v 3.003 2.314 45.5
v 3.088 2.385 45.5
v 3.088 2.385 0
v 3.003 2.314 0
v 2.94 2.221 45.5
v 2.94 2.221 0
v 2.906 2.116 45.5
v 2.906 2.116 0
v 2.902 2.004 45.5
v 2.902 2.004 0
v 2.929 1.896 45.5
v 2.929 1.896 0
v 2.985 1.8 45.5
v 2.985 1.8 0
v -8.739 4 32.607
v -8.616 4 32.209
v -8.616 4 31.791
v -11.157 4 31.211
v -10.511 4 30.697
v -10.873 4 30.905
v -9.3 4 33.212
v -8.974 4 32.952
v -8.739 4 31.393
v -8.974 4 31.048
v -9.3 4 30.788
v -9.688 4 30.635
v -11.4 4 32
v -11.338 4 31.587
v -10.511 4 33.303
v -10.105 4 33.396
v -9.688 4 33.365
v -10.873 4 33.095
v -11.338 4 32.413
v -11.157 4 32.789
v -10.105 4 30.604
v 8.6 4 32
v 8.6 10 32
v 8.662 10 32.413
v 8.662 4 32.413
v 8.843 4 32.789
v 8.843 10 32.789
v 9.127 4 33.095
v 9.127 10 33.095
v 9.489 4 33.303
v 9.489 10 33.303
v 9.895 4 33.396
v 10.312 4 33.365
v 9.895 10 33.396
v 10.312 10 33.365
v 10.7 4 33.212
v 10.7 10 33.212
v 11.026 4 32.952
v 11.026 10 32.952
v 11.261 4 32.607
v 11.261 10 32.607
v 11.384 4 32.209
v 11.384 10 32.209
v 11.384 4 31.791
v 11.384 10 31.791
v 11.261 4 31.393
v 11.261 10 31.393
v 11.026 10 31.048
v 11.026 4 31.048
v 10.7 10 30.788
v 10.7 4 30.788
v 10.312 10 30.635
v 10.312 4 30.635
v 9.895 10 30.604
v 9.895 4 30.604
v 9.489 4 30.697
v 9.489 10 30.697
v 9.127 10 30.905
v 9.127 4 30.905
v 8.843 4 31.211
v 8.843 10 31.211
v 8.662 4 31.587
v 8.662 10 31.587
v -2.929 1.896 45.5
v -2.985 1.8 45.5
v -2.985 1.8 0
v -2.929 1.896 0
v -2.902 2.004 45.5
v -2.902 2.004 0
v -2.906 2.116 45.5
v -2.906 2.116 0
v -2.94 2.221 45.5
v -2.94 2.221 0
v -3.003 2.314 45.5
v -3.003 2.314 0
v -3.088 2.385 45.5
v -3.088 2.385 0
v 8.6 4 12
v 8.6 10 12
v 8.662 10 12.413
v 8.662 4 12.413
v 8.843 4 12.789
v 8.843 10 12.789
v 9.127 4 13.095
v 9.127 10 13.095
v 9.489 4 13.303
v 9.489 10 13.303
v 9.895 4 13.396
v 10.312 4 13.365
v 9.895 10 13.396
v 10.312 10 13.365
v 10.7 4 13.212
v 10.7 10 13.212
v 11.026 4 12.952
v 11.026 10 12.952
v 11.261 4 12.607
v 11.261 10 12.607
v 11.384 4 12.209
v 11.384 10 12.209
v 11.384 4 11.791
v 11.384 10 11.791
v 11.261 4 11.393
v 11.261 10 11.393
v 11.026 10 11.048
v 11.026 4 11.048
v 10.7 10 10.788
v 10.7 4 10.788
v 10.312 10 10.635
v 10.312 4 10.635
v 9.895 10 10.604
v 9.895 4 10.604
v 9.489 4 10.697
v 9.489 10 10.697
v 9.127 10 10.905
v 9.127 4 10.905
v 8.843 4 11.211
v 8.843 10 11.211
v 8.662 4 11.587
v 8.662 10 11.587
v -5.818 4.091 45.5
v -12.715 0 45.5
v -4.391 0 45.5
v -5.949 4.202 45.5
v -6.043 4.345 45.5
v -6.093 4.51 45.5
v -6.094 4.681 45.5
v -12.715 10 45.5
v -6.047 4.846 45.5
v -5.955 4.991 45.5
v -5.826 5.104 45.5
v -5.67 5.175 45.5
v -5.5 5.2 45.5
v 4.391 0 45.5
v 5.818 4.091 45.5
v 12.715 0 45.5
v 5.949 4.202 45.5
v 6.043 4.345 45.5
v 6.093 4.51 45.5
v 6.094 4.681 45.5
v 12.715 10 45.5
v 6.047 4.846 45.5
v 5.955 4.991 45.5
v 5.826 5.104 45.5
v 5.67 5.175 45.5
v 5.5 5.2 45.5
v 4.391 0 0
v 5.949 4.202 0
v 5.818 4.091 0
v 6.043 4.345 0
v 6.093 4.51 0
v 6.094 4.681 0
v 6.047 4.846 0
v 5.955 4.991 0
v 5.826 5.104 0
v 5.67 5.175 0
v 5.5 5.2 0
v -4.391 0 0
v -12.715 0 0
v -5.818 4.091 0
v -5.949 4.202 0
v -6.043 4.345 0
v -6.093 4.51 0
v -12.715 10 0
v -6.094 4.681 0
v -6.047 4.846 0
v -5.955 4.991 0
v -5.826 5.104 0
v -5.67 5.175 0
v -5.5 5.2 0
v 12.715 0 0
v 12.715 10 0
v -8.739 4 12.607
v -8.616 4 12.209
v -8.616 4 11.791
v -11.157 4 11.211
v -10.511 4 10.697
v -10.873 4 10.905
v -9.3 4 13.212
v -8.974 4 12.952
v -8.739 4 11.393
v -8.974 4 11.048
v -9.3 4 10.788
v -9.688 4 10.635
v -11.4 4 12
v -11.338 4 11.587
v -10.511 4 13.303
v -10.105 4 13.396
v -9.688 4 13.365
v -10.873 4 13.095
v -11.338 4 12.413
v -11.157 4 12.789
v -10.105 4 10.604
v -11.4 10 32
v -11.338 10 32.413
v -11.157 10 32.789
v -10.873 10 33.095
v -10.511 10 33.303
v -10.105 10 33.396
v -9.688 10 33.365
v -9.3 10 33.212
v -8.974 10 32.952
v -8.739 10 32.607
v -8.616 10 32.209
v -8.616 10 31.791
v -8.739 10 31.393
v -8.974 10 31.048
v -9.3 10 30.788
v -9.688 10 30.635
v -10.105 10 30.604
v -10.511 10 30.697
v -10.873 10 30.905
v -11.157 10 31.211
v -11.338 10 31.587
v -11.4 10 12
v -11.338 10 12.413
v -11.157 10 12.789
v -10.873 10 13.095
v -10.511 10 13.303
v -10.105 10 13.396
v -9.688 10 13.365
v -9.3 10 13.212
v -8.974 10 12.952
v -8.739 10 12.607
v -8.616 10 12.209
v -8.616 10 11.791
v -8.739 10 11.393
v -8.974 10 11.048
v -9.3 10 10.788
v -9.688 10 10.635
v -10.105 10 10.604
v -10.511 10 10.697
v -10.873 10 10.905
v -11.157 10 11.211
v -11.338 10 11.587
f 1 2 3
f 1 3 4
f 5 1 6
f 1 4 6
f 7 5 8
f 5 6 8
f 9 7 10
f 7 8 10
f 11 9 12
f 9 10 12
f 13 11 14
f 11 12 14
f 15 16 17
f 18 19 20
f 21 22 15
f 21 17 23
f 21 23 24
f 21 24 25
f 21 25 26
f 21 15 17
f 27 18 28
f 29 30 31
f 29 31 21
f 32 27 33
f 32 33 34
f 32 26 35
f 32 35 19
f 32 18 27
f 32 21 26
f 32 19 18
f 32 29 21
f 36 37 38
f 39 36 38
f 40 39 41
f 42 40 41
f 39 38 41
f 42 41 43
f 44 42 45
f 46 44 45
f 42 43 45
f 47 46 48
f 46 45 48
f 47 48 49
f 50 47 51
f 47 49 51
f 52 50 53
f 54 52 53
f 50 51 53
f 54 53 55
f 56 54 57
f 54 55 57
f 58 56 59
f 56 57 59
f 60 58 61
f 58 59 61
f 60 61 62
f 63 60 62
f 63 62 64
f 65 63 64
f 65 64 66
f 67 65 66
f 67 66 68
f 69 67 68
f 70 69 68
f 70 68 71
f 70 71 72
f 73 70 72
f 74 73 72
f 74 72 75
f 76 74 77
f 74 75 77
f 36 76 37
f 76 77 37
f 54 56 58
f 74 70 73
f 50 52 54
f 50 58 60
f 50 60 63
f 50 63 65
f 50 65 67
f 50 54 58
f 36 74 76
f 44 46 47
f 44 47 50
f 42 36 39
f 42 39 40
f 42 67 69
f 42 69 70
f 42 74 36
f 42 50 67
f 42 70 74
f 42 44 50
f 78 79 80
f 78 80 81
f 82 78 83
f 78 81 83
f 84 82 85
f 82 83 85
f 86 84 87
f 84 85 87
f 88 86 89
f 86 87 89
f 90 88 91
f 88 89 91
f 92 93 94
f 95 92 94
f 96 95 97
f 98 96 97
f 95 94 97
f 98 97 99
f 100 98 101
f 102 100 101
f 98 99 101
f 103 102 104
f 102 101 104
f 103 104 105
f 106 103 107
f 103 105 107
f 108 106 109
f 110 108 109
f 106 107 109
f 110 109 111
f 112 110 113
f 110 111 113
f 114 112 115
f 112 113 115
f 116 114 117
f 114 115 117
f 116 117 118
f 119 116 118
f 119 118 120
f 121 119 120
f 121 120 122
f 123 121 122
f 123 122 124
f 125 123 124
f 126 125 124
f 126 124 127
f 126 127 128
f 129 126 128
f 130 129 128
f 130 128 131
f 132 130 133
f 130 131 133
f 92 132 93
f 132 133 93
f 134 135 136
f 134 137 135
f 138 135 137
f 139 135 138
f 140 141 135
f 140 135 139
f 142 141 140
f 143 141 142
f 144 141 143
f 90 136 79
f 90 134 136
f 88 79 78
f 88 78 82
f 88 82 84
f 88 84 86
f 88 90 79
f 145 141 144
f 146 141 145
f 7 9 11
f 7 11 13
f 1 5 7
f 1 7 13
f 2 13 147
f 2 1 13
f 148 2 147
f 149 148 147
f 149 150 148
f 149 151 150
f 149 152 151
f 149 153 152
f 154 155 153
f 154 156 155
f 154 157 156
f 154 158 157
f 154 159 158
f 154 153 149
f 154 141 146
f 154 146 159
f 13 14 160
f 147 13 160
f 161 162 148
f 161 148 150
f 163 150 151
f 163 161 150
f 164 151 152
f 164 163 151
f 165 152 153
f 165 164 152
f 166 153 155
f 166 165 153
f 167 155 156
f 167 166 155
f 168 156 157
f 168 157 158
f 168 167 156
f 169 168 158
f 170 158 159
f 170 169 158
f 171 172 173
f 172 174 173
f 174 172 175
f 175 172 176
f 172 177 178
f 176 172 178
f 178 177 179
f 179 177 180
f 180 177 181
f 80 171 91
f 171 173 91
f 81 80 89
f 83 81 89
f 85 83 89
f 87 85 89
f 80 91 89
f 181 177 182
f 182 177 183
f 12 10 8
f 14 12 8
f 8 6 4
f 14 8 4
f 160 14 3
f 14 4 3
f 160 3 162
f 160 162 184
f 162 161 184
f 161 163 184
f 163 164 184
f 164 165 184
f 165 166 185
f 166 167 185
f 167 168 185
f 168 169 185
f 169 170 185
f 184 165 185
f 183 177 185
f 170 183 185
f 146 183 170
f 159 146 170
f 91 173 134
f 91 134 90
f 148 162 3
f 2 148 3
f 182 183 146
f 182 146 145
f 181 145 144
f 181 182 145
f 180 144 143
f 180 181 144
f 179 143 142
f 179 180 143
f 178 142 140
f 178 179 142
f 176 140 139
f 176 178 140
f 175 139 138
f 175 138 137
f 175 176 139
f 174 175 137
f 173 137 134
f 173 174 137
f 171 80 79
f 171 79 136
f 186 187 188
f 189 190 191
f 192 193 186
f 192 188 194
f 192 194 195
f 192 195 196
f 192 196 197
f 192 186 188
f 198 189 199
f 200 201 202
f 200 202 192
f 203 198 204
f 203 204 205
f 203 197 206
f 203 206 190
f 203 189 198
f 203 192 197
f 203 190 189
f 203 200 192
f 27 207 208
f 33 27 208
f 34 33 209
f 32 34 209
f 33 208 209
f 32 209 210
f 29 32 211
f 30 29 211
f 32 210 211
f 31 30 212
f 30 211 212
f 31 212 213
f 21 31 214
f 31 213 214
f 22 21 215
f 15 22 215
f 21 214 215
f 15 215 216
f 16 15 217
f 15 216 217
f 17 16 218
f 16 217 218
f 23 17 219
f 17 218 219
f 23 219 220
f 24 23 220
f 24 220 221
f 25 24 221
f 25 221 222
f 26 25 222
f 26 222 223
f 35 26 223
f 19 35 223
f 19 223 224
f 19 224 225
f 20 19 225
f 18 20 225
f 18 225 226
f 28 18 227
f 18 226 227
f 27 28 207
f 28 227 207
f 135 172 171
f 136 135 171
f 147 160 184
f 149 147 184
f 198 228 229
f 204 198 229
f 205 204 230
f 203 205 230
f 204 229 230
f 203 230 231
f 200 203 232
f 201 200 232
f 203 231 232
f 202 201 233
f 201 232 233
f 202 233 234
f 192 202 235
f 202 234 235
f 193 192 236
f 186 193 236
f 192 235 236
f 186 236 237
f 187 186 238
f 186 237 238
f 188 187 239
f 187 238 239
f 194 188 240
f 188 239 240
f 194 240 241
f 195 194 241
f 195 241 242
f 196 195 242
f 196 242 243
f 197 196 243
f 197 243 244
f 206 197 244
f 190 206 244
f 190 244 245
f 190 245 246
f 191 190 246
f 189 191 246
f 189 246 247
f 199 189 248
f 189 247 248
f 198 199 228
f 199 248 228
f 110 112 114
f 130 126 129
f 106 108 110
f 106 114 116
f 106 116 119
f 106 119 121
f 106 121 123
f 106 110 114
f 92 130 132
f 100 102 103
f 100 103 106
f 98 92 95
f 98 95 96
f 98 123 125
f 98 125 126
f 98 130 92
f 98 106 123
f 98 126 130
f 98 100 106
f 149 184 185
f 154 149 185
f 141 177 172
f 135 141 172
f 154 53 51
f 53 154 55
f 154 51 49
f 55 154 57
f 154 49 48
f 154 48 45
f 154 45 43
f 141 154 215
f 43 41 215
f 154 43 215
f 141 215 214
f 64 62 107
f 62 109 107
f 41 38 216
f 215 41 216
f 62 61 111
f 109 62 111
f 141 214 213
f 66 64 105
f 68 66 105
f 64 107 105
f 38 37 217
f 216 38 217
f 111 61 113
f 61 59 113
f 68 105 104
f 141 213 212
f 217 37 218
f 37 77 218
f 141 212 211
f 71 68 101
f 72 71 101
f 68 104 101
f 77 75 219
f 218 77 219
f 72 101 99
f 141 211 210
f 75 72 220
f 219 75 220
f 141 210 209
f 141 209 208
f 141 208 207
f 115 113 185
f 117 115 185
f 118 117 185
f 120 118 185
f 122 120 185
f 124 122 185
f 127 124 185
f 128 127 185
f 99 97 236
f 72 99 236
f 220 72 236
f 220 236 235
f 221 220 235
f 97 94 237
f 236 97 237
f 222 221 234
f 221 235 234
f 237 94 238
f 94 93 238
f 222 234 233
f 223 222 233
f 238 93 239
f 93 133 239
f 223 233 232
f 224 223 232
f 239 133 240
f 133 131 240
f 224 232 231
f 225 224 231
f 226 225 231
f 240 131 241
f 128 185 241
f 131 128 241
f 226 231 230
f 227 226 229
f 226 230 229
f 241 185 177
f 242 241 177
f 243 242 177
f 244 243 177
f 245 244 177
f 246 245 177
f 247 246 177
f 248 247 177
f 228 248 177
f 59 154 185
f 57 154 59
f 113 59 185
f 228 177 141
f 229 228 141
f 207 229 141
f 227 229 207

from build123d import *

# Parameters (mm, degrees)
PAD_DEPTH    = 45.5
SKETCH001_R  = 1.4
POCKET_DEPTH = 6


with BuildPart() as part:
    # Sketch → Pad (new body)
    with BuildSketch(Plane.XY):
        with BuildLine():
            Line((12.715, 0), (12.715, 10))
            Line((12.715, 10), (-12.715, 10))
            Line((-12.715, 10), (-12.715, 0))
            Line((-12.715, 0), (-4.390988, 0))
            Line((-2.984796, 1.799844), (-4.390988, 0))
            ThreePointArc((-2.984796, 1.799844), (-2.906077, 2.115568), (-3.088032, 2.385328))
            Line((-5.817952, 4.091171), (-3.088032, 2.385328))
            ThreePointArc((-5.5, 5.2), (-6.076757, 4.765382), (-5.817952, 4.091171))
            Line((-5.5, 5.2), (5.5, 5.2))
            ThreePointArc((5.817952, 4.091171), (6.076757, 4.765382), (5.5, 5.2))
            Line((5.817952, 4.091171), (3.088032, 2.385328))
            ThreePointArc((3.088032, 2.385328), (2.906077, 2.115568), (2.984796, 1.799844))
            Line((2.984796, 1.799844), (4.390988, 0))
            Line((4.390988, 0), (12.715, 0))
        make_face()
    extrude(amount=PAD_DEPTH)

    # Sketch001 (on Face6 of Pad) → Pocket (cut)
    with BuildSketch(Plane(origin=(0, 10, 0), x_dir=(-1, 0, 0), z_dir=(0, 1, 0))):
        with Locations((-10, 12)):
            Circle(SKETCH001_R)
        with Locations((-10, 32)):
            Circle(SKETCH001_R)
        with Locations((10, 32)):
            Circle(SKETCH001_R)
        with Locations((10, 12)):
            Circle(SKETCH001_R)
    extrude(amount=-POCKET_DEPTH, mode=Mode.SUBTRACT)


solid = part.part
